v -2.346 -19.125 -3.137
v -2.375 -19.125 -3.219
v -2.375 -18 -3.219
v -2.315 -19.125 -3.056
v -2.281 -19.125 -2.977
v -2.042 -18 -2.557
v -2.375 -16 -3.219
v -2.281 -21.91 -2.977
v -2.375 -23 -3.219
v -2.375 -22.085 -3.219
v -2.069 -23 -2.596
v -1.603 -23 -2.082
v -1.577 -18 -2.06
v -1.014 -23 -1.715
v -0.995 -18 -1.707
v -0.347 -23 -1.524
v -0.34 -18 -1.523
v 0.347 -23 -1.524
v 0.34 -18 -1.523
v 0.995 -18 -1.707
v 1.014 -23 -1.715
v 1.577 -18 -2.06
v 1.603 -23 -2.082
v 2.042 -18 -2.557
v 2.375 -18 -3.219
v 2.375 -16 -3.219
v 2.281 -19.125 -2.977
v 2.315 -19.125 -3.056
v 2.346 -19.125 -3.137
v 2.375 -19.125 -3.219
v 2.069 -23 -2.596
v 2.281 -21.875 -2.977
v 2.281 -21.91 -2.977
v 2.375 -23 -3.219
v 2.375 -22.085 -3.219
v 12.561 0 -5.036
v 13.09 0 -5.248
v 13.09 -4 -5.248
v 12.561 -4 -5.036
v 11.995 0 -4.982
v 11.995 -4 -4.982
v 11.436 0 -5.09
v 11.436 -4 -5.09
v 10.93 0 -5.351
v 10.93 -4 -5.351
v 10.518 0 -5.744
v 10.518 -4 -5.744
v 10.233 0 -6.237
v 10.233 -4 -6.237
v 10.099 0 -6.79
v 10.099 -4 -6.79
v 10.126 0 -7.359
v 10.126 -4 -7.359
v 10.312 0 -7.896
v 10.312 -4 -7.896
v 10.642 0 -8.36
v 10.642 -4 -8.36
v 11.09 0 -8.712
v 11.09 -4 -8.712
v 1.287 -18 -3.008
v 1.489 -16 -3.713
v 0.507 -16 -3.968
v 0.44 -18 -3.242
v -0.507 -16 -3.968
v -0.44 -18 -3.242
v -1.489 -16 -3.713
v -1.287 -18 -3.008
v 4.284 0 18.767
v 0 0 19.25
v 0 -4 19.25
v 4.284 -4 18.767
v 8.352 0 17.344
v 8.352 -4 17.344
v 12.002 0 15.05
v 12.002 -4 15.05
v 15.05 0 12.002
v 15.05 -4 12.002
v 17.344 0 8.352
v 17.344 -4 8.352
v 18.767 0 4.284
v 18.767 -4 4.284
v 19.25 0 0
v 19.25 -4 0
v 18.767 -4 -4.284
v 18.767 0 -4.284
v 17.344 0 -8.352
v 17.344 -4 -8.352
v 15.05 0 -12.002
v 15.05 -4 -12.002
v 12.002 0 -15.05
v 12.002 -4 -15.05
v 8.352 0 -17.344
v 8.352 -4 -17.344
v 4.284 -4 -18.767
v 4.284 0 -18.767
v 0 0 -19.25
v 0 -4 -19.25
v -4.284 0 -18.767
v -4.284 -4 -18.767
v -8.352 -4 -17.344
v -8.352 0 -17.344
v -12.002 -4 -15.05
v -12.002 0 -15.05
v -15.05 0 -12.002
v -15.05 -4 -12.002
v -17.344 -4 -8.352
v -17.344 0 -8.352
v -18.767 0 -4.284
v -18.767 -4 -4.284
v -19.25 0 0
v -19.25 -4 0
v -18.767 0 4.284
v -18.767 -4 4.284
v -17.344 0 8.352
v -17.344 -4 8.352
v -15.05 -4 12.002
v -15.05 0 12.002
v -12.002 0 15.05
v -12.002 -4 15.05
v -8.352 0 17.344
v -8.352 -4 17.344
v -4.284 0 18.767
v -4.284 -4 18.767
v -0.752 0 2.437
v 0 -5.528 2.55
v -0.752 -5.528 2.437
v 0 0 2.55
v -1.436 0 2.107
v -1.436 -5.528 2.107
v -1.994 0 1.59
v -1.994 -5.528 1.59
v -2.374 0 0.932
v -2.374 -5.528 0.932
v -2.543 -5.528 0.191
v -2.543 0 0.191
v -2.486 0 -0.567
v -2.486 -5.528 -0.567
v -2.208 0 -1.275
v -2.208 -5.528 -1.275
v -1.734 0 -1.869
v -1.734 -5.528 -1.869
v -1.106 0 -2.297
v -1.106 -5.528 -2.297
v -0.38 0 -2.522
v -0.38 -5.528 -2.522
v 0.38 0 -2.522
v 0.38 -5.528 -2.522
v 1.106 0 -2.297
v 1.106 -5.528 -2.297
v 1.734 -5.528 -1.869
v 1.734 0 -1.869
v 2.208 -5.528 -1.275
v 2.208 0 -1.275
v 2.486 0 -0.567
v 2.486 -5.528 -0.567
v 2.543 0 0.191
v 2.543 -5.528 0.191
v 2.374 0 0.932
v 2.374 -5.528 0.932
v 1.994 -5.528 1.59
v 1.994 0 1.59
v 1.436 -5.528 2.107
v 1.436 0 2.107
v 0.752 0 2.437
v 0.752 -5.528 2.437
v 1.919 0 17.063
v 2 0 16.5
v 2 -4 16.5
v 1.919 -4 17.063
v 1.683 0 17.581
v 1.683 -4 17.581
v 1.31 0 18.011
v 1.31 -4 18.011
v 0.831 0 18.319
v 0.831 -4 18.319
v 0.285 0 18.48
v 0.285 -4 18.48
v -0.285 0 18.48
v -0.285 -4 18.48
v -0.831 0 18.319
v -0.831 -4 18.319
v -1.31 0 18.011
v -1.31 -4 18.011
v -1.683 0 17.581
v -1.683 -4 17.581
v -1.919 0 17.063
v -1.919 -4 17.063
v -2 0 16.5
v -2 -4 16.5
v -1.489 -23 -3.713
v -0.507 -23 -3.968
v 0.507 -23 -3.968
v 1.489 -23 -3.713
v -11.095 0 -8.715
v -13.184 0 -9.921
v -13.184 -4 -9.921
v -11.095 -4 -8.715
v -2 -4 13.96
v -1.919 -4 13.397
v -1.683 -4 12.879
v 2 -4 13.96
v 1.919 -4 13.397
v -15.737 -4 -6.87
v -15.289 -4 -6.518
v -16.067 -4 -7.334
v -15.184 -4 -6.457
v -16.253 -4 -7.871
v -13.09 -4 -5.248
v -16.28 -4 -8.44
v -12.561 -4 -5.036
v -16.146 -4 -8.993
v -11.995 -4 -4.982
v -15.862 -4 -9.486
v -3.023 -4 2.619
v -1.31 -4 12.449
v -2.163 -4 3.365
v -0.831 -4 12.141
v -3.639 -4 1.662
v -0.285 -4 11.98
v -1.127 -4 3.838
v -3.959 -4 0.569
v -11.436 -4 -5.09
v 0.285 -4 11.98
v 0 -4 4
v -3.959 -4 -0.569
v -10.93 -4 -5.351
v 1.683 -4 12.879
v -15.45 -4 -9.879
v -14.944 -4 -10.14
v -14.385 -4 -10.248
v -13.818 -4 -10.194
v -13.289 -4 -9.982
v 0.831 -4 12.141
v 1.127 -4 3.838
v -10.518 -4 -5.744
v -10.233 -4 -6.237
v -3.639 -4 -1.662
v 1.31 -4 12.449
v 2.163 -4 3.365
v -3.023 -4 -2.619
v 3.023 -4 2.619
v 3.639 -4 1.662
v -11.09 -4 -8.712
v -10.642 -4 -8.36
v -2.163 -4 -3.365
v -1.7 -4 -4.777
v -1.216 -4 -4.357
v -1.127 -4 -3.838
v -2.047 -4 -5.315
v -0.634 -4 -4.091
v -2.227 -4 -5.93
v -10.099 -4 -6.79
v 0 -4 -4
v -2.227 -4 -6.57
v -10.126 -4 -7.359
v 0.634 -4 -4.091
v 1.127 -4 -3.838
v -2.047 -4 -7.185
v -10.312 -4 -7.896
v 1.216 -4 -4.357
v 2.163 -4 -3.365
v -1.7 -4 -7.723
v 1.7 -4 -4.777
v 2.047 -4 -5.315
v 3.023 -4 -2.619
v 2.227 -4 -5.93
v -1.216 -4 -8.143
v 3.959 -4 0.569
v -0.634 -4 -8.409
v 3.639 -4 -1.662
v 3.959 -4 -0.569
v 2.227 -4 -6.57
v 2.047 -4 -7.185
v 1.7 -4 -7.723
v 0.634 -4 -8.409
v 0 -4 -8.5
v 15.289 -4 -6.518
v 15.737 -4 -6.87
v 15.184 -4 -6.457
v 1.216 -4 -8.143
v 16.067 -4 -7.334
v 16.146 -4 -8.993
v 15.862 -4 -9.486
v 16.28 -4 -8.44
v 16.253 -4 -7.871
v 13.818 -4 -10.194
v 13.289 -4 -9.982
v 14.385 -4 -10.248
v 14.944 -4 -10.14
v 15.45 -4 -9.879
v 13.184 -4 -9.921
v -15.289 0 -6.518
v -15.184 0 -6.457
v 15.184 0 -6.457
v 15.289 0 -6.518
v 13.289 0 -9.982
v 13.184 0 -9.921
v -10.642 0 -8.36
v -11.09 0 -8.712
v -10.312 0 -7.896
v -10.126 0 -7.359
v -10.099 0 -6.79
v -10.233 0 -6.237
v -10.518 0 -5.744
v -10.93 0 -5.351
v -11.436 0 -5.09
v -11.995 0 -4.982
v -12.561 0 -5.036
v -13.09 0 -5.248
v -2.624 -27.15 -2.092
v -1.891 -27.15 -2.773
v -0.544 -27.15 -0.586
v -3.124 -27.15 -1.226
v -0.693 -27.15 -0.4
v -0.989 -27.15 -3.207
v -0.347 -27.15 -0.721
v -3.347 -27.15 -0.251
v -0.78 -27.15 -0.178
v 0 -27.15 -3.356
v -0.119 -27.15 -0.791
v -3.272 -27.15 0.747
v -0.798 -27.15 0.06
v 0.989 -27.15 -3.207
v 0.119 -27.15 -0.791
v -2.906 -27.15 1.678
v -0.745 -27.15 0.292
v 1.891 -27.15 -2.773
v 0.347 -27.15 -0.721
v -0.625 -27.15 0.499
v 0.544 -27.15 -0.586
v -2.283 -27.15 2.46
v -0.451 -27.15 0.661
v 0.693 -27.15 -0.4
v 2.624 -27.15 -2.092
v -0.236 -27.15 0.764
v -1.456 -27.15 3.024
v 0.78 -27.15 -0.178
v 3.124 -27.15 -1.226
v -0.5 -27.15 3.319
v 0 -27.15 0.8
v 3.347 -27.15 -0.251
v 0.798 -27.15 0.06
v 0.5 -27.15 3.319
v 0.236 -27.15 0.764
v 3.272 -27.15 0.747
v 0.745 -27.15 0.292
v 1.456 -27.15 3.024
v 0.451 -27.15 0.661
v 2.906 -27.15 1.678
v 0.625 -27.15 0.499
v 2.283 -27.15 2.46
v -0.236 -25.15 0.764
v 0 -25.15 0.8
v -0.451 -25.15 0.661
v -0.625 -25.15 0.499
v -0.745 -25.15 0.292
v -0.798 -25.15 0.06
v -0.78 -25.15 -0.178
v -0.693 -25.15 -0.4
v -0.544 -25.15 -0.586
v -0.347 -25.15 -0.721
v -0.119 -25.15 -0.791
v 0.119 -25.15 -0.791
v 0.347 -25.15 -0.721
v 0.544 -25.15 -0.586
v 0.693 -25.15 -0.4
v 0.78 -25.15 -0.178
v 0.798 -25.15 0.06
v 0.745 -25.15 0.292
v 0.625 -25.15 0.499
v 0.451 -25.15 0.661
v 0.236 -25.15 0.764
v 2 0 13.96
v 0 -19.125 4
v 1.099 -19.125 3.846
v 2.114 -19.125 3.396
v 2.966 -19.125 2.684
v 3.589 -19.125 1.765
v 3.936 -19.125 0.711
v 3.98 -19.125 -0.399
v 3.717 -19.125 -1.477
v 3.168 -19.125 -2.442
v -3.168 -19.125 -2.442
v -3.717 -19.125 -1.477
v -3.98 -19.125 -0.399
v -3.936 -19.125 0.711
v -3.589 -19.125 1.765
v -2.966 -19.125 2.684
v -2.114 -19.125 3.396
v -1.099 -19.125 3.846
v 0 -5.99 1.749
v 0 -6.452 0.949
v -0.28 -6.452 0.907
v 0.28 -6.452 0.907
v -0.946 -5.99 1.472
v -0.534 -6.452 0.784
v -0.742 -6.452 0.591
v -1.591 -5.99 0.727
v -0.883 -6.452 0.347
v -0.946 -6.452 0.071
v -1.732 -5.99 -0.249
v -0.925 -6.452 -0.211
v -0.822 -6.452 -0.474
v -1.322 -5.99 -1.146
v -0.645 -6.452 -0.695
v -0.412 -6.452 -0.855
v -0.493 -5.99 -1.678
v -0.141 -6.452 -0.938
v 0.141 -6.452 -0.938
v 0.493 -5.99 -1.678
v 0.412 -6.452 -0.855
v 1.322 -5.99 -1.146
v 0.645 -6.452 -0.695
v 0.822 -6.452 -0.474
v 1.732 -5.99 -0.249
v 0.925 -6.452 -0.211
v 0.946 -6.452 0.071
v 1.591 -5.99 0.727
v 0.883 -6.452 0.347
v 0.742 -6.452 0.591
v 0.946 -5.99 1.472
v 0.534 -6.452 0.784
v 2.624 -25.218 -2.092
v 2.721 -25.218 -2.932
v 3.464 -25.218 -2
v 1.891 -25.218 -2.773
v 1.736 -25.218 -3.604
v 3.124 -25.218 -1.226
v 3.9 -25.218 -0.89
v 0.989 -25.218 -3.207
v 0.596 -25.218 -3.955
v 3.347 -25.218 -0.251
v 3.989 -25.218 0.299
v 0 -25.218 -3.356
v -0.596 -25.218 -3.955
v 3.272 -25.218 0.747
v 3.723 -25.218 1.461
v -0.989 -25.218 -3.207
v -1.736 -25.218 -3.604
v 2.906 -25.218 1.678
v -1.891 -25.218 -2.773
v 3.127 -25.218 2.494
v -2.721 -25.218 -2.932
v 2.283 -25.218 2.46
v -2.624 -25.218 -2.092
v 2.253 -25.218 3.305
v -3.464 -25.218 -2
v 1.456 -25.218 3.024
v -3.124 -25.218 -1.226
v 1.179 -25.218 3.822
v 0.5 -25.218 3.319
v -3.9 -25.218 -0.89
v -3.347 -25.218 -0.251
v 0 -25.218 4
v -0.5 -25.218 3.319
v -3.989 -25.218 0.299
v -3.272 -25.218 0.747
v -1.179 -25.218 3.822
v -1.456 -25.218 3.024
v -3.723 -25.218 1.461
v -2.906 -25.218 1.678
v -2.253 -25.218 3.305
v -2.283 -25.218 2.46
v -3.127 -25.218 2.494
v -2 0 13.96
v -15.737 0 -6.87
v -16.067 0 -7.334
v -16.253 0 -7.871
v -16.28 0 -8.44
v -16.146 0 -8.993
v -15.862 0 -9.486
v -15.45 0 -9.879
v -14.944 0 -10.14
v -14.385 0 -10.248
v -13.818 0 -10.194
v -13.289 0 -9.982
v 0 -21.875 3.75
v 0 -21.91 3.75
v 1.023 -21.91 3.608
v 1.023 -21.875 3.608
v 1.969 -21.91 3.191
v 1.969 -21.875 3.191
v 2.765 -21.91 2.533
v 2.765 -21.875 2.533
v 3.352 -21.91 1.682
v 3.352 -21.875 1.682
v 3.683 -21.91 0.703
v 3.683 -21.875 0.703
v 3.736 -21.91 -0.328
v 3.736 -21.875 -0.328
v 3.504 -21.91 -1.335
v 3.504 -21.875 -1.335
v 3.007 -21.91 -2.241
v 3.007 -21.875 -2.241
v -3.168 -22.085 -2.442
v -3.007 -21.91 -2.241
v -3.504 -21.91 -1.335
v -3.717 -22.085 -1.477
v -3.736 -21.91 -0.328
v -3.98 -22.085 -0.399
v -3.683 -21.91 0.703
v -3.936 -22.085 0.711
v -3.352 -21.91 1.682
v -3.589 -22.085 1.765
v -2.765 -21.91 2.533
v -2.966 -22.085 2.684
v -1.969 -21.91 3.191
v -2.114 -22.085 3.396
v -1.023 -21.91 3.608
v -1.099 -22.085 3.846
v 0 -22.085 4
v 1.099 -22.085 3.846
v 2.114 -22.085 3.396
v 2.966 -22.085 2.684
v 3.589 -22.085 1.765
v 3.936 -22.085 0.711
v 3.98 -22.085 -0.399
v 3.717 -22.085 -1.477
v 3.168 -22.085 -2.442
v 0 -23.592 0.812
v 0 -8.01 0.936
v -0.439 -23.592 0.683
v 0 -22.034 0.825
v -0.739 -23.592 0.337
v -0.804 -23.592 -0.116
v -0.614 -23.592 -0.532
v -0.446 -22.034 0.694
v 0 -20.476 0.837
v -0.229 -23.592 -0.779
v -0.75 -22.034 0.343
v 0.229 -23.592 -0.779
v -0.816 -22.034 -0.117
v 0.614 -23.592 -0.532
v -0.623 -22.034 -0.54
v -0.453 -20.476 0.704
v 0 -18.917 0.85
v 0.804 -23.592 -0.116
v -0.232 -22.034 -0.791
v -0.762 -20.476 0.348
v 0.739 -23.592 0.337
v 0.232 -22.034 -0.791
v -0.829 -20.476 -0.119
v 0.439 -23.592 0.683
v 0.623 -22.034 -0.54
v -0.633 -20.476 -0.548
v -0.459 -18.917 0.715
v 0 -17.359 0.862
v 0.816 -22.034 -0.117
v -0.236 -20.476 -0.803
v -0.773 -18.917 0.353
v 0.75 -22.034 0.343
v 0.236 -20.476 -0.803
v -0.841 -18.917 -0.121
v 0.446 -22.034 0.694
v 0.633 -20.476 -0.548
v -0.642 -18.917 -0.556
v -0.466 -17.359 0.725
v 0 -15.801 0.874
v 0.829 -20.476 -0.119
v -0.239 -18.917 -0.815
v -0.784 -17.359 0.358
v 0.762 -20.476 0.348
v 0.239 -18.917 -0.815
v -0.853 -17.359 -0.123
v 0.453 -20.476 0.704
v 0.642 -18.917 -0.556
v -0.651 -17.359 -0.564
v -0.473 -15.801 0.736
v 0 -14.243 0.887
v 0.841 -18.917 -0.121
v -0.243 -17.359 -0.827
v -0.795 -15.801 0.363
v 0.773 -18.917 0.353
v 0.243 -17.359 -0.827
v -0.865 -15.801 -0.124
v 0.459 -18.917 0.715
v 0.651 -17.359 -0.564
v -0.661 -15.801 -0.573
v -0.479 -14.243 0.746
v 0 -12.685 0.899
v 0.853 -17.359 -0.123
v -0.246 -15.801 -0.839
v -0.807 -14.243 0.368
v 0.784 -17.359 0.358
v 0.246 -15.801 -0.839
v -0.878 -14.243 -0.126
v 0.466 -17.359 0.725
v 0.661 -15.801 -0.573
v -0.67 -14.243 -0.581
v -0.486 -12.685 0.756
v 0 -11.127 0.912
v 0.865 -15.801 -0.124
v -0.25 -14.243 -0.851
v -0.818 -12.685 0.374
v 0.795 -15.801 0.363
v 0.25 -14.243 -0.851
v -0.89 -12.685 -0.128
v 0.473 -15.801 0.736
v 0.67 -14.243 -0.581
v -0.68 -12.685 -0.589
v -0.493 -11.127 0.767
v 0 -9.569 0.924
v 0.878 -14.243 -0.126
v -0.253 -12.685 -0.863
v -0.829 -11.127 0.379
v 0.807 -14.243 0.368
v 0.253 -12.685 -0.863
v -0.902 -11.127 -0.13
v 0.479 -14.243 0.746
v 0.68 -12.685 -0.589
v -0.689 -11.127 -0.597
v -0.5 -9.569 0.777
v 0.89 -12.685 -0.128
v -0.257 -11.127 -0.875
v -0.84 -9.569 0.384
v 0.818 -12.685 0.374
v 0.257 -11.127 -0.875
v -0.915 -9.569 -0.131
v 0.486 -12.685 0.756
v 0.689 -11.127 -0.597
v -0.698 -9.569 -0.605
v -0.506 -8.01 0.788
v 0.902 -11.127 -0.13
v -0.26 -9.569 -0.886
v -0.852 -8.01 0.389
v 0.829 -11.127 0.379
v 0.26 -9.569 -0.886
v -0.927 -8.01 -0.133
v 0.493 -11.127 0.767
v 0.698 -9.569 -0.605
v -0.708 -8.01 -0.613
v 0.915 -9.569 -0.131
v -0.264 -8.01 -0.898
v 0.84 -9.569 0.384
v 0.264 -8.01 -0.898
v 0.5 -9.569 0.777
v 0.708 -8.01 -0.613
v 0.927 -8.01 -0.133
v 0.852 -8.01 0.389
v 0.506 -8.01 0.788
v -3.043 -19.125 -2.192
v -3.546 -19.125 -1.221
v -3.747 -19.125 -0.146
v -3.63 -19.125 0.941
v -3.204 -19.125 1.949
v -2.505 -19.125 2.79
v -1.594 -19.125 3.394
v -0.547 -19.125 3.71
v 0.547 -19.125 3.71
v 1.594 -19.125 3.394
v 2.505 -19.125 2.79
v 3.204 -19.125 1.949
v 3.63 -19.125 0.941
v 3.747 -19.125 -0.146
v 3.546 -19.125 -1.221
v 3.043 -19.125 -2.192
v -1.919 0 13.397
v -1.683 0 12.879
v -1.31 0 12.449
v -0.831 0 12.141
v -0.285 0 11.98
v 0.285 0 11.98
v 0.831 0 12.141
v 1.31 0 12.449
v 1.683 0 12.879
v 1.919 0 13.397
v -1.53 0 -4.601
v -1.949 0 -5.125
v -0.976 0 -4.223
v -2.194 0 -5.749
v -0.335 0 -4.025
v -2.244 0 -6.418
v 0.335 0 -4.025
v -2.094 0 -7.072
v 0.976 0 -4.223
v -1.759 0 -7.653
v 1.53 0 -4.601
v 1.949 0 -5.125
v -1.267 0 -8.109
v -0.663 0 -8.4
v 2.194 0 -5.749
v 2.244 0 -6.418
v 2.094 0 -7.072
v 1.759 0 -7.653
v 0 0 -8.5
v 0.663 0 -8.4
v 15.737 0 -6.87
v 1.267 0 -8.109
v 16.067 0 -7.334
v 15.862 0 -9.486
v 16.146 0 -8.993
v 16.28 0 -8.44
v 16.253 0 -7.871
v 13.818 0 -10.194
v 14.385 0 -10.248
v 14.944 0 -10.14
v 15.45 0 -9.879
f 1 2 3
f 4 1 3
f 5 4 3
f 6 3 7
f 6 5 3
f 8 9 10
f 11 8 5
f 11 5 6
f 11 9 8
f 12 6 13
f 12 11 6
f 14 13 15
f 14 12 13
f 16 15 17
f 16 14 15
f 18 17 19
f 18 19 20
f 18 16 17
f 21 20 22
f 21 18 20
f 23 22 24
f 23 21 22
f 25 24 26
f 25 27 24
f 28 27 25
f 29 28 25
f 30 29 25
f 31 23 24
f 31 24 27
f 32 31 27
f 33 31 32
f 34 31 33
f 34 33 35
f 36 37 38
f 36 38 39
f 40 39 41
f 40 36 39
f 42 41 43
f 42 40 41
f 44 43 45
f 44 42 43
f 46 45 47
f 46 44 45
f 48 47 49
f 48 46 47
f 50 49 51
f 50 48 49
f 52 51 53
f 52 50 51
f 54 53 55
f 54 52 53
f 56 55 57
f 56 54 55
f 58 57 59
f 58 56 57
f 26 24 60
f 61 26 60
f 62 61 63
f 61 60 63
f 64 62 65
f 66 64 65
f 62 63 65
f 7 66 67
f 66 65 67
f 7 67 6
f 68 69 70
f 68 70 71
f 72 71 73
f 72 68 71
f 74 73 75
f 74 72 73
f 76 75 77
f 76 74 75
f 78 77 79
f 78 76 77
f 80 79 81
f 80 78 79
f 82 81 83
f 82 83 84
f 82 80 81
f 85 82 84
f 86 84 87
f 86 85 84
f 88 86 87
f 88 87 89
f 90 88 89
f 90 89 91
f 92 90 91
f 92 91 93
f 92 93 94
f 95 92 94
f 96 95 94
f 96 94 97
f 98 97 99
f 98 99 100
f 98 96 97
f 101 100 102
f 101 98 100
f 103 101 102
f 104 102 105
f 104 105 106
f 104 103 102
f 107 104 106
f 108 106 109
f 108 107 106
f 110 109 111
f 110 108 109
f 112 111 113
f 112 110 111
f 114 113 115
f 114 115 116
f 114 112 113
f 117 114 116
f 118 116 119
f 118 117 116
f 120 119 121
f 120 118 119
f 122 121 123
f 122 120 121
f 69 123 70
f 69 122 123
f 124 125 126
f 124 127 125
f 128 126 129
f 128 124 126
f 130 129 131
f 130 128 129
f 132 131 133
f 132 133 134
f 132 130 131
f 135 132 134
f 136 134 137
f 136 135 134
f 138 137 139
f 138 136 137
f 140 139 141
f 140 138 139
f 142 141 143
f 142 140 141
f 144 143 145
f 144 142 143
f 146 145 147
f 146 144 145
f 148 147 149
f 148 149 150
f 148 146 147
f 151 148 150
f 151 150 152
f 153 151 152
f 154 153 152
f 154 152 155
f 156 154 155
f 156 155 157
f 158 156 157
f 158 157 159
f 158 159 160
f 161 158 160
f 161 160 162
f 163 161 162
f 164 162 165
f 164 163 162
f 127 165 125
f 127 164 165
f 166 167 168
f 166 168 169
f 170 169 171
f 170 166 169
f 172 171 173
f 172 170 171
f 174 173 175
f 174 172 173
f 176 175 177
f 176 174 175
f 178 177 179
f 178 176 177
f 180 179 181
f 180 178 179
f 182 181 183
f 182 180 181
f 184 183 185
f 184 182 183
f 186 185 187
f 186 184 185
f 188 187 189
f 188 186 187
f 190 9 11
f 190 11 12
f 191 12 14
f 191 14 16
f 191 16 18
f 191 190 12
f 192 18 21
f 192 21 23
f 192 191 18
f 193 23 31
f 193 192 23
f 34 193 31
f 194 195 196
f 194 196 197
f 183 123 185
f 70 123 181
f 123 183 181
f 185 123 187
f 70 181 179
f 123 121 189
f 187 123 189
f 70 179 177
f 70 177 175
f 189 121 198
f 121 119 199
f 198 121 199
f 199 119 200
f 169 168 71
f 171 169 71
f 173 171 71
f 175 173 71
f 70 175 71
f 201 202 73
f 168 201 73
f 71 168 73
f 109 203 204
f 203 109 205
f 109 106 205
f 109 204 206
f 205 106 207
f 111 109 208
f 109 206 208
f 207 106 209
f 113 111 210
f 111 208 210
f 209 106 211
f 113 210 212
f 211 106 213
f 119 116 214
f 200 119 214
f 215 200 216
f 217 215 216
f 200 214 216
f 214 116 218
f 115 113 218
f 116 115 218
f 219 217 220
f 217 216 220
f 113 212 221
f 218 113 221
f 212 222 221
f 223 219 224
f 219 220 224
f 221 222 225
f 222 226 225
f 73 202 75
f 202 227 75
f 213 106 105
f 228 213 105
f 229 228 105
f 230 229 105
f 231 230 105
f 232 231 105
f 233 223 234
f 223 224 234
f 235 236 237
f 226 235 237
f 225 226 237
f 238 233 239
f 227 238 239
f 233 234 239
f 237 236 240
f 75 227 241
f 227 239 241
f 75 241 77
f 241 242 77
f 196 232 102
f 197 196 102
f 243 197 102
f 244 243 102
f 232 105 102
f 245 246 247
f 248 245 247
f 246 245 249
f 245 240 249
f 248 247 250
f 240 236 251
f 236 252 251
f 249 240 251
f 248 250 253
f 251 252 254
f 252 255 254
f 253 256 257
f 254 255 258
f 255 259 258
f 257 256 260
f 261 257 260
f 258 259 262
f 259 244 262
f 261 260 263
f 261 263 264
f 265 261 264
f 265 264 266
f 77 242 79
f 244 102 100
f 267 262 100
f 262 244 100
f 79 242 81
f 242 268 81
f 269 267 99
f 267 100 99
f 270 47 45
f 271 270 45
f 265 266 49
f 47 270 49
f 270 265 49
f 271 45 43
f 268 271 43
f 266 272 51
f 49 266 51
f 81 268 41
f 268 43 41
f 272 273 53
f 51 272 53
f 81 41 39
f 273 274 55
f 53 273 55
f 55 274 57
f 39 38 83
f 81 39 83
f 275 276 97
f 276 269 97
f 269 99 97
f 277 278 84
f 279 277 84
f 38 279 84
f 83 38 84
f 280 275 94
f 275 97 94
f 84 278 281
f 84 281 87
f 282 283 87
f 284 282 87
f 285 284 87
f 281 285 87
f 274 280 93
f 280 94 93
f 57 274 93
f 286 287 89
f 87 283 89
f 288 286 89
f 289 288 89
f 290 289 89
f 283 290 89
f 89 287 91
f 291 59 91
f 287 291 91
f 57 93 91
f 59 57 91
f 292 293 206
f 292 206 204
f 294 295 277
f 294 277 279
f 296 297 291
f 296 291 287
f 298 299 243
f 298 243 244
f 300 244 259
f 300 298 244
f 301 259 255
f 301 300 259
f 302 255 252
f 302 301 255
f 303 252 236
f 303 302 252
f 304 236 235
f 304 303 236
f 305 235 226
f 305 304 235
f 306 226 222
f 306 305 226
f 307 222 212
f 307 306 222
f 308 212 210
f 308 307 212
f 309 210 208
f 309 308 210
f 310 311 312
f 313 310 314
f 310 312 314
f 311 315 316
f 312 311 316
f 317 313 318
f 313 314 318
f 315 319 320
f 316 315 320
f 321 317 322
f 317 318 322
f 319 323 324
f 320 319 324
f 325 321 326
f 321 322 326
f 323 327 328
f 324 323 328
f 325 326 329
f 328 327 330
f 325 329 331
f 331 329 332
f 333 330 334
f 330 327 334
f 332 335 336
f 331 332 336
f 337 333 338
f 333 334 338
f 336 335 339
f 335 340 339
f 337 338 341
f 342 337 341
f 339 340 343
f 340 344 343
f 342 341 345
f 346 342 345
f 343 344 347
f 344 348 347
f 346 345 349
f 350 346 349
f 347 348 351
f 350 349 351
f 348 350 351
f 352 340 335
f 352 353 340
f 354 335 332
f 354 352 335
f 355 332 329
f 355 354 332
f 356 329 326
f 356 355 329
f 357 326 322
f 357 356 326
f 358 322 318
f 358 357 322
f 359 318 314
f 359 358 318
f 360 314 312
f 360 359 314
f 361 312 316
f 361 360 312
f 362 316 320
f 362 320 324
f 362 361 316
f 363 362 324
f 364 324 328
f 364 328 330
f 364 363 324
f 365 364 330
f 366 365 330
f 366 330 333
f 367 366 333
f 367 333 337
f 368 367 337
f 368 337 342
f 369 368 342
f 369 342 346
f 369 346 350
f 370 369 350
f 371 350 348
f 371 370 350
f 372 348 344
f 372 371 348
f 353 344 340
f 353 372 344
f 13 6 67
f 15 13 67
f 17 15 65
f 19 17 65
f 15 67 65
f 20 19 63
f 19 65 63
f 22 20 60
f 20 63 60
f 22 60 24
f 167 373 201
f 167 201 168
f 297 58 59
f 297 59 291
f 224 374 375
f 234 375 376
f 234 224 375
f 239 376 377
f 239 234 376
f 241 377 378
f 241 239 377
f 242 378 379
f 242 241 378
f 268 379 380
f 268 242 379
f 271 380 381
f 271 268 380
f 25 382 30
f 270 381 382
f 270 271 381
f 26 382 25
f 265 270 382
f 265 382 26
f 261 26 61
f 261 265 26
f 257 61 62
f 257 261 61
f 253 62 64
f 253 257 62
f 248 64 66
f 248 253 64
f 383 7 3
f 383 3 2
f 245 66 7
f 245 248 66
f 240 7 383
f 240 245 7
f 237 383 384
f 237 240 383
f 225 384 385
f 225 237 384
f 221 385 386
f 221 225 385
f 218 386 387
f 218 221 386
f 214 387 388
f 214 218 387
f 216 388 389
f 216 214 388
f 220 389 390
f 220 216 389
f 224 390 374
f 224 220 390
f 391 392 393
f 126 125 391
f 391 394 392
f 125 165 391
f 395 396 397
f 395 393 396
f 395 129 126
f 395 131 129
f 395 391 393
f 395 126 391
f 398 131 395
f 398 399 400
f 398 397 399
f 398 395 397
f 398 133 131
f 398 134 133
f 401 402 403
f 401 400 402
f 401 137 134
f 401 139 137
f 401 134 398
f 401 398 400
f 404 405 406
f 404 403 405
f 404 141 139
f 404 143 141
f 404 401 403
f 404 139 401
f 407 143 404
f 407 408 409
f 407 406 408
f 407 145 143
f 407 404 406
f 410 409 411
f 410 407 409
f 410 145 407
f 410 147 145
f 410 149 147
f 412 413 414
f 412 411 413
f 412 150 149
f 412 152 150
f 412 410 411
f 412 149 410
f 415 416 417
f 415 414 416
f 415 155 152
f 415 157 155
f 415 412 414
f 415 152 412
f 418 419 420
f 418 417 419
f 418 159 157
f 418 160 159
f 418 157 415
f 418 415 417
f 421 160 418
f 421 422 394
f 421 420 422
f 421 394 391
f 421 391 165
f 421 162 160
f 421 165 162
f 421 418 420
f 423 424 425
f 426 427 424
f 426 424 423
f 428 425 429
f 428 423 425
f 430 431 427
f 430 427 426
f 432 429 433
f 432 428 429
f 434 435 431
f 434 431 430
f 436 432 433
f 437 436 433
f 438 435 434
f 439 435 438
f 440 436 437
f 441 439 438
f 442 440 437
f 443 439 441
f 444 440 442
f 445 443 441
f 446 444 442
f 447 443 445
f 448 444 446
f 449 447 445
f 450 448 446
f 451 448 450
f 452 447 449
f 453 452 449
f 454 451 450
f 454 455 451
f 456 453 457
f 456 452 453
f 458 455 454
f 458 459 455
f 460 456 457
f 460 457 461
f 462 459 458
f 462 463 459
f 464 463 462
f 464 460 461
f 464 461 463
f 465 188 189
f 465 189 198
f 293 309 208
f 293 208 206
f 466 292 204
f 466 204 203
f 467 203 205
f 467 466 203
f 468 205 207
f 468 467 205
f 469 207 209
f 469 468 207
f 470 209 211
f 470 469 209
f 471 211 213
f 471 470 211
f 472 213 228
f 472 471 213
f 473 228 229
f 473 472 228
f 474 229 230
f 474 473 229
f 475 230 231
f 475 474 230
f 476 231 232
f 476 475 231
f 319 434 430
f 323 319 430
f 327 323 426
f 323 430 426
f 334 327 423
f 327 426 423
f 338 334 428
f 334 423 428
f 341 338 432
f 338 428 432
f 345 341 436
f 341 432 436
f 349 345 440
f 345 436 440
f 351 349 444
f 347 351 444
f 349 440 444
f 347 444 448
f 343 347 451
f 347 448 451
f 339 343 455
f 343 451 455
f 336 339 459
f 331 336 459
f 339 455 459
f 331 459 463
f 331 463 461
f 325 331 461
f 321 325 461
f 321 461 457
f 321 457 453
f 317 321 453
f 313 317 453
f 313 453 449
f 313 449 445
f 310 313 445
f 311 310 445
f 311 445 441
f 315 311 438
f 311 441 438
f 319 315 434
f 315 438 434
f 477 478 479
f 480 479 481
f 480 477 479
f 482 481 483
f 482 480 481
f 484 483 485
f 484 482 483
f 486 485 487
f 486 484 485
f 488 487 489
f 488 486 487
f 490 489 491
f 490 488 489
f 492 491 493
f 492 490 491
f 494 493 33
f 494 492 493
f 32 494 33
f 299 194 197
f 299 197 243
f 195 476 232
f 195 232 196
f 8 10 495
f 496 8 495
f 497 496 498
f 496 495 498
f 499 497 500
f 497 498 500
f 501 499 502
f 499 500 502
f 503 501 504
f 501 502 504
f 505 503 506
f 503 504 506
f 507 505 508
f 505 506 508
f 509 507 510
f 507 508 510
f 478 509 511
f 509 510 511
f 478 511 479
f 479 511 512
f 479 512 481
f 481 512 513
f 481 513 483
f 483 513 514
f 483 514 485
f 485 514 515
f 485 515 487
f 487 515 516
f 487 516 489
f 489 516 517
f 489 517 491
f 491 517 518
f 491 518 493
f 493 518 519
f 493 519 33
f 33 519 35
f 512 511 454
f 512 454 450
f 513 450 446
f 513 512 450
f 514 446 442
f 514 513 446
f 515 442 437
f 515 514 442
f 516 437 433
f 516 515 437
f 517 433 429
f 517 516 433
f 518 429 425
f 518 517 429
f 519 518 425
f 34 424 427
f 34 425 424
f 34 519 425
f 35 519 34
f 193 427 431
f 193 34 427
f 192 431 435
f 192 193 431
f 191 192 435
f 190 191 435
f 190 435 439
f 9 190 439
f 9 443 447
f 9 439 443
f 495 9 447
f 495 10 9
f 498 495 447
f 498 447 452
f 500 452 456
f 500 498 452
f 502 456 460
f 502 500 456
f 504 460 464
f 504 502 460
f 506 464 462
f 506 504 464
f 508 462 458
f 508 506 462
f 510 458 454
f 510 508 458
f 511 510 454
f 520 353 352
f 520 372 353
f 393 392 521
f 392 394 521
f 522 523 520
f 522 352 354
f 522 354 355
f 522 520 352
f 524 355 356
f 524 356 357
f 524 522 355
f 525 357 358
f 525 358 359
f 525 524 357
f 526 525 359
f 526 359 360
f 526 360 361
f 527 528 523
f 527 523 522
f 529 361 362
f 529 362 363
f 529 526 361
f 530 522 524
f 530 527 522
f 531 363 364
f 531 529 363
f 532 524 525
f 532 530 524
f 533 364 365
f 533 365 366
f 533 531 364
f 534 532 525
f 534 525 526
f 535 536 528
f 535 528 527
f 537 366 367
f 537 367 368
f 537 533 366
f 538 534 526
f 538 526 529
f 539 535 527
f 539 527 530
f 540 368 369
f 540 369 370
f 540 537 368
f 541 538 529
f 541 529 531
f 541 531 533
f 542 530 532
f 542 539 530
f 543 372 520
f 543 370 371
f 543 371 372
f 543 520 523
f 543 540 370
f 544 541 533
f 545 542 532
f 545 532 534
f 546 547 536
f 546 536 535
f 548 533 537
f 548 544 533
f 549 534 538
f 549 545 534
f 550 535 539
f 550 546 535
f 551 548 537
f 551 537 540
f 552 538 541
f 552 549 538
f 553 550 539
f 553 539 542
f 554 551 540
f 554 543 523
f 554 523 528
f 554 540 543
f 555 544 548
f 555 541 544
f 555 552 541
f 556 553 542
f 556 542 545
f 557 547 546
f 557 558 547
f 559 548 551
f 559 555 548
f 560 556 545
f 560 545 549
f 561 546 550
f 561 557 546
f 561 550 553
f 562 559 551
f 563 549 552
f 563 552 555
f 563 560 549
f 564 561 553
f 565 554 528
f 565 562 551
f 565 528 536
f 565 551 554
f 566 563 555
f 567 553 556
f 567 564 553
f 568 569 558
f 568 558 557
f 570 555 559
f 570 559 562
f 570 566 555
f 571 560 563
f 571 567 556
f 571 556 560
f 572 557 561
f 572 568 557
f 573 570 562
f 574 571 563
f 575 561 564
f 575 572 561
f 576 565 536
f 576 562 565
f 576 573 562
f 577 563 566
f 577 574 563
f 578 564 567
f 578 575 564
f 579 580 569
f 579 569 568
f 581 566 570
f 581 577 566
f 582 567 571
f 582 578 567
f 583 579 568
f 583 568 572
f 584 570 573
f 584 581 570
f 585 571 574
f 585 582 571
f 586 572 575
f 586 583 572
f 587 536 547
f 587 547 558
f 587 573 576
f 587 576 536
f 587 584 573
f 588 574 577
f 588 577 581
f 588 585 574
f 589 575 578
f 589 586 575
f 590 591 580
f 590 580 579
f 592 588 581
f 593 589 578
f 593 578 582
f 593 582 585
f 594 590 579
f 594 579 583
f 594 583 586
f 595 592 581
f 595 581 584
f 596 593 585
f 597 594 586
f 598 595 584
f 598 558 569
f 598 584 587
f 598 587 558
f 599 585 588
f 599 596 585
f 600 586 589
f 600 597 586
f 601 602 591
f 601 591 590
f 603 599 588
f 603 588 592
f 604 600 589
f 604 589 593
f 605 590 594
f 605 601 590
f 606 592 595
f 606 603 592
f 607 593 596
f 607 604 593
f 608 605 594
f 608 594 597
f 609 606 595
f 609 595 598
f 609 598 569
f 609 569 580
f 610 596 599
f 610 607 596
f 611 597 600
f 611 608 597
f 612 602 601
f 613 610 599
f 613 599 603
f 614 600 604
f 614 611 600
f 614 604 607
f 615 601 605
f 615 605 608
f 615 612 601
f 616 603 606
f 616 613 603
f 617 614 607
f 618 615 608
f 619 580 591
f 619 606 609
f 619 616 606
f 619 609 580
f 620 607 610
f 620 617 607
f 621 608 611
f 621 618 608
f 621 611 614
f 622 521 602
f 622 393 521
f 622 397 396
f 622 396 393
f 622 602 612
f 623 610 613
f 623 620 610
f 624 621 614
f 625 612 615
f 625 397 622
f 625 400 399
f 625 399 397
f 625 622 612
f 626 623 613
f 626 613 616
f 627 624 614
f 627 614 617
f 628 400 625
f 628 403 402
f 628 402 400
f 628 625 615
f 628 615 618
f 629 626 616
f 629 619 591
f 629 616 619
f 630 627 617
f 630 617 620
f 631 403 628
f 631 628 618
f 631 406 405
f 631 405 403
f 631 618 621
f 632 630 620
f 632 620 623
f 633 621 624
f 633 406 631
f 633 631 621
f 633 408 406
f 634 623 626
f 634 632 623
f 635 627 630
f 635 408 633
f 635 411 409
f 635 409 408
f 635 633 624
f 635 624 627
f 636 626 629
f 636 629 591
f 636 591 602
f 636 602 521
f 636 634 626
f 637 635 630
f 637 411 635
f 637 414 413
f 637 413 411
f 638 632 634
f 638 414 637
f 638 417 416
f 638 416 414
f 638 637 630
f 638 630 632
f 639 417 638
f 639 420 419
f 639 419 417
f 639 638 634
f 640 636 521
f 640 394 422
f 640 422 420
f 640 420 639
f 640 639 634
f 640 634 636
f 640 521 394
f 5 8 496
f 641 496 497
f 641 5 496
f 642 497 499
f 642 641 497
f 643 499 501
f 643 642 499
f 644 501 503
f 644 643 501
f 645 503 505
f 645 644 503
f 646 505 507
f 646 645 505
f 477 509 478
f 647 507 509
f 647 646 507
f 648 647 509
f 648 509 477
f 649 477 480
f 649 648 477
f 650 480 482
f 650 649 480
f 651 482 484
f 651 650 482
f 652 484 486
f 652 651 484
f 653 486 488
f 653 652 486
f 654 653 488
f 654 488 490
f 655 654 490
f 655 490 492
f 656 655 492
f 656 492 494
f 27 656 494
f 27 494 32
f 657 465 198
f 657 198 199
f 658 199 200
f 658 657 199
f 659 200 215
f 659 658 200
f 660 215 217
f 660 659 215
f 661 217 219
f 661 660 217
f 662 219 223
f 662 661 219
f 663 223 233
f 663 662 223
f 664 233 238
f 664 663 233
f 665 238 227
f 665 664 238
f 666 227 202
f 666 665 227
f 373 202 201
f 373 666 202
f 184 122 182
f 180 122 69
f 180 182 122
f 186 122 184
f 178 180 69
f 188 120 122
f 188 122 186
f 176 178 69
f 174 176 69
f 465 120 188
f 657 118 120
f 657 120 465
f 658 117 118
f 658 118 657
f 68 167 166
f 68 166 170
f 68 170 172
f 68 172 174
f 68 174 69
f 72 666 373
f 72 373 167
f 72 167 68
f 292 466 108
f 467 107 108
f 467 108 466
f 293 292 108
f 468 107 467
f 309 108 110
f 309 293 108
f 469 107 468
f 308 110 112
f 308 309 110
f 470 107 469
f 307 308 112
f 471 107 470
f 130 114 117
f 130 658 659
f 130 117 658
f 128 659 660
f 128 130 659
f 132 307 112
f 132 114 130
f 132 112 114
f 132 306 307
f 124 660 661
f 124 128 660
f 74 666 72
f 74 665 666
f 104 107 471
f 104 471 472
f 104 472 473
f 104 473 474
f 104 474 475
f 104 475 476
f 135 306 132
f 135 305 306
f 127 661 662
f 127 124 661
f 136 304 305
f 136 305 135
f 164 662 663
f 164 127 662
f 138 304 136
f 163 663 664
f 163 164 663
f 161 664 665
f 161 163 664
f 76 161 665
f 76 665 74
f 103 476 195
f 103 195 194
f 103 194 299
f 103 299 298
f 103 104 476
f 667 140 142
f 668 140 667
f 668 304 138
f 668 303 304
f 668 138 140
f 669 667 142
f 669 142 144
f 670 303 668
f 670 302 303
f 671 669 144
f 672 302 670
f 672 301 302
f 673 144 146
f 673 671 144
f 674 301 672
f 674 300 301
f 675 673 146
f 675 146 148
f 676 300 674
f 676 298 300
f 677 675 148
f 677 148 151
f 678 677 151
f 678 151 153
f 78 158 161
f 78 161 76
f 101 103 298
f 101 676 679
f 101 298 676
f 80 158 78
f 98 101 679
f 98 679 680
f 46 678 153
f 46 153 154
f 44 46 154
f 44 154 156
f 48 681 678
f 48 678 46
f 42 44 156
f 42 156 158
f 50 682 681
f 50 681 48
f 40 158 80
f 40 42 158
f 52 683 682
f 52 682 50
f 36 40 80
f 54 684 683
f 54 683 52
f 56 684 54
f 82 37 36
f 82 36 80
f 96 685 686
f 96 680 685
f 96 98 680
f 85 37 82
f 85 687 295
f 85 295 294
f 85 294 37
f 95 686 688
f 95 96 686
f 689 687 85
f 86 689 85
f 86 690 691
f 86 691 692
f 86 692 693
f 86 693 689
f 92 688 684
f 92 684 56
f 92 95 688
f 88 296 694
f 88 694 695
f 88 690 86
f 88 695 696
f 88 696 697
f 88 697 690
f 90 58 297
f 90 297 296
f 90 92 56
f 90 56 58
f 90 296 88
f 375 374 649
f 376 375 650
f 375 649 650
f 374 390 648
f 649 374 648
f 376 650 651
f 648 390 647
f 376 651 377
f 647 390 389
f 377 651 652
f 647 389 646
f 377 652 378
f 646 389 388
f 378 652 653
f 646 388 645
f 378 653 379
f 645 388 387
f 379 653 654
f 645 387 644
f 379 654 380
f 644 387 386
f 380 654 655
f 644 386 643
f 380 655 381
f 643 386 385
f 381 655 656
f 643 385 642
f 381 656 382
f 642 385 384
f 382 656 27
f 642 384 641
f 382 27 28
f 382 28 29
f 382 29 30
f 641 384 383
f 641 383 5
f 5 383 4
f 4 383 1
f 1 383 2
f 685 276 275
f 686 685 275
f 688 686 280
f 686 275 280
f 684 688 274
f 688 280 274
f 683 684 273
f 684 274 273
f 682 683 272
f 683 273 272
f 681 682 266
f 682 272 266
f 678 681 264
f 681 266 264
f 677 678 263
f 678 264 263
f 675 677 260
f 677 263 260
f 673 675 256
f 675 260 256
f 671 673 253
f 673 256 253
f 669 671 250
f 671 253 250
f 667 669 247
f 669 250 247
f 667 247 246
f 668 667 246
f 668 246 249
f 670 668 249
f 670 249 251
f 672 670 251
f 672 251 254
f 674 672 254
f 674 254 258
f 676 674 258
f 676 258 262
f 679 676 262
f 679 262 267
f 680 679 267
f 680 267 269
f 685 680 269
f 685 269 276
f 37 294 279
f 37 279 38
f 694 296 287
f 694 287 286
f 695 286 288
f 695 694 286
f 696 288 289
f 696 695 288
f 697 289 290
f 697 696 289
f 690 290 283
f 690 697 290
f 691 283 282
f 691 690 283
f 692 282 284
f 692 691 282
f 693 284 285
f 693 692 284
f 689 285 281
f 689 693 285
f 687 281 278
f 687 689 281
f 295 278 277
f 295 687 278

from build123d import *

# Parameters (mm, degrees)
SKETCH1_R           = 19.25
SKETCH1_R_2         = 4
BOSS_EXTRUDE1_DEPTH = 4
SKETCH1_4_R         = 4
BOSS_EXTRUDE2_DEPTH = 27.15
CUT_EXTRUDE1_START  = -1.932
SKETCH6_R           = 4
SKETCH6_R_2         = 3.356
CUT_EXTRUDE1_DEPTH  = 1.932
SKETCH7_R           = 2.25
CUT_EXTRUDE2_DEPTH  = 36.735801376
SKETCH8_R           = 2.5
CUT_EXTRUDE3_DEPTH  = 5
CHAMFER1_SIZE       = 2
CHAMFER1_SIZE2      = 0.727940469
SKETCH9_W           = 0.25
SKETCH9_H           = 2.75
CHAMFER3_SIZE       = 0.3
CHAMFER3_SIZE_2     = 0.210062261


with BuildPart() as part:
    # Sketch1 → Boss-Extrude1 (new body)
    # profile 1 of 2: a face of its own
    with BuildSketch(Plane(origin=(0, 0, 0), x_dir=(1, 0, 0), z_dir=(0, 1, 0))):
        with Locations(Location((0, 0, 0), (0, 0, 270))):
            Circle(SKETCH1_R)
        with BuildLine():
            ThreePointArc((2, -16.5), (0, -18.5), (-2, -16.5))
            Line((-2, -16.5), (-2, -16.378339354))
            ThreePointArc((-2, -16.378339354), (-14.289419162, -8.25), (-15.184057953, 6.45711887))
            Line((-15.184057953, 6.45711887), (-15.289419162, 6.517949192))
            ThreePointArc((-15.289419162, 6.517949192), (-16.02146997, 9.25), (-13.289419162, 9.982050808))
            Line((-13.289419162, 9.982050808), (-13.184057953, 9.921220485))
            ThreePointArc((-13.184057953, 9.921220485), (0, 16.5), (13.184057953, 9.921220485))
            Line((13.184057953, 9.921220485), (13.289419162, 9.982050808))
            ThreePointArc((13.289419162, 9.982050808), (16.02146997, 9.25), (15.289419162, 6.517949192))
            Line((15.289419162, 6.517949192), (15.184057953, 6.45711887))
            ThreePointArc((15.184057953, 6.45711887), (16.167667677, 3.294923655), (16.5, 0))
            ThreePointArc((16.5, 0), (12.354149101, -10.937321427), (2, -16.378339354))
            Line((2, -16.378339354), (2, -16.5))
        make_face(mode=Mode.SUBTRACT)
    # profile 2 of 2: a face of its own
    with BuildSketch(Plane(origin=(0, 0, 0), x_dir=(1, 0, 0), z_dir=(0, 1, 0))):
        with BuildLine():
            ThreePointArc((-15.184057953, 6.45711887), (-14.289419162, -8.25), (-2, -16.378339354))
            Line((-2, -16.378339354), (-2, -13.96))
            ThreePointArc((-2, -13.96), (0, -11.96), (2, -13.96))
            Line((2, -13.96), (2, -16.378339354))
            ThreePointArc((2, -16.378339354), (12.354149101, -10.937321427), (16.5, 0))
            ThreePointArc((16.5, 0), (16.167667677, 3.294923655), (15.184057953, 6.45711887))
            Line((15.184057953, 6.45711887), (13.089714637, 5.247949192))
            ThreePointArc((13.089714637, 5.247949192), (10.357663829, 5.98), (11.089714637, 8.712050808))
            Line((11.089714637, 8.712050808), (13.184057953, 9.921220485))
            ThreePointArc((13.184057953, 9.921220485), (0, 16.5), (-13.184057953, 9.921220485))
            Line((-13.184057953, 9.921220485), (-11.094979939, 8.715090731))
            Line((-11.094979939, 8.715090731), (-11.089714637, 8.712050808))
            ThreePointArc((-11.089714637, 8.712050808), (-10.357663829, 5.98), (-13.089714637, 5.247949192))
            Line((-13.089714637, 5.247949192), (-15.184057953, 6.45711887))
        make_face()
        with Locations(Location((0, 0, 0), (0, 0, 270))):
            Circle(SKETCH1_R_2, mode=Mode.SUBTRACT)
    extrude(amount=-BOSS_EXTRUDE1_DEPTH)

    # Sketch1<4> → Boss-Extrude2 (add)
    with BuildSketch(Plane(origin=(0, 0, 0), x_dir=(1, 0, 0), z_dir=(0, 1, 0))):
        with Locations(Location((0, 0, 0), (0, 0, 270))):
            Circle(SKETCH1_4_R)
    extrude(amount=-BOSS_EXTRUDE2_DEPTH)

    # Sketch2 → Cut-Revolve4 (revolve, cut)
    with BuildSketch(Plane(origin=(0, 0, 0), x_dir=(0, 0, -1), z_dir=(1, 0, 0)), mode=Mode.PRIVATE) as cut_revolve4_sk:
        Polygon((0, -27.15), (0.8, -27.15), (0.8, -25.15), (1, 0), (0, 0), align=None)
    revolve(cut_revolve4_sk.sketch.rotate(Axis((0, 0, 0), (0, -1, 0)), 180), axis=Axis((0, 0, 0), (0, -1, 0)), mode=Mode.SUBTRACT)

    # Sketch5 → Cut-Revolve8 (revolve, cut)
    with BuildSketch(Plane.XY, mode=Mode.PRIVATE) as cut_revolve8_sk:
        Polygon((0, -7), (-2.55, -5.527756814), (-2.55, 0), (0, 0), align=None)
    revolve(cut_revolve8_sk.sketch.rotate(Axis((0, 0, 0), (0, -1, 0)), 270), axis=Axis((0, 0, 0), (0, -1, 0)), mode=Mode.SUBTRACT)

    # Sketch6 → Cut-Extrude1 (cut)
    with BuildSketch(Plane.XZ.offset(27.15).offset(CUT_EXTRUDE1_START)):
        with Locations(Location((0, 0, 0), (0, 0, 90))):
            Circle(SKETCH6_R)
        with Locations(Location((0, 0, 0), (0, 0, 270))):
            Circle(SKETCH6_R_2, mode=Mode.SUBTRACT)
    extrude(amount=CUT_EXTRUDE1_DEPTH, mode=Mode.SUBTRACT)

    # Sketch7 → Cut-Extrude2 (cut, through all)
    with BuildSketch(Plane.XZ.offset(4)):
        with Locations(Location((0, -6.25, 0), (0, 0, 270))):
            Circle(SKETCH7_R)
    extrude(amount=-CUT_EXTRUDE2_DEPTH, mode=Mode.SUBTRACT)

    # Sketch8 → Cut-Extrude3 (cut)
    with BuildSketch(Plane(origin=(0, -23, 0), x_dir=(1, 0, 0), z_dir=(0, 1, 0))):
        with Locations((0, 4)):
            Circle(SKETCH8_R)
    extrude(amount=CUT_EXTRUDE3_DEPTH, mode=Mode.SUBTRACT)

    # Chamfer1
    chamfer1_edges = [part.edges().sort_by_distance(p)[0] for p in [
        (0, -18, -4),
    ]]
    chamfer1_side = [part.faces().sort_by_distance(p)[0] for p in [
        (0, -14.609, -4),
    ]]
    chamfer(chamfer1_edges, length=CHAMFER1_SIZE, length2=CHAMFER1_SIZE2, reference=chamfer1_side[0])

    # Sketch9 → Cut-Revolve9 (revolve, cut)
    with BuildSketch(Plane(origin=(0, 0, 0), x_dir=(0, 0, -1), z_dir=(1, 0, 0)), mode=Mode.PRIVATE) as cut_revolve9_sk:
        with Locations((-3.875, -20.5)):
            Rectangle(SKETCH9_W, SKETCH9_H)
    revolve(cut_revolve9_sk.sketch.rotate(Axis((0, -27.15, 0), (0, 1, 0)), 143.580086271), axis=Axis((0, -27.15, 0), (0, 1, 0)), mode=Mode.SUBTRACT)

    # Chamfer3
    # the kernel refuses this chamfer: 0.3, 0.210062261 mm, written as the material it takes off along each edge
    with BuildSketch(Plane(origin=(0, -21.875, 0), x_dir=(-0.42752924874280274, 0, -0.9040015162981834), z_dir=(0.9040015162981834, 0, -0.42752924874280274))) as chamfer3_piece_1_section:
        Polygon((4 - CHAMFER3_SIZE, 0), (4, -CHAMFER3_SIZE_2 * 1.0000000022), (4, 0), align=None)
    chamfer3_piece_1 = revolve(axis=Axis((0, -21.875, 0), (0, 1, 0)), revolution_arc=154.689138052, mode=Mode.PRIVATE)
    chamfer3_piece_1 = chamfer3_piece_1 - Plane(origin=(0, -21.995167344, 0), x_dir=(0.593698599754949, 0, -0.8046874999955033), z_dir=(0, -1, 0)) * Cylinder(3.75, 16, mode=Mode.PRIVATE)
    add(chamfer3_piece_1, mode=Mode.SUBTRACT)
    with BuildSketch(Plane(origin=(0, -21.875, 0), x_dir=(0, 0, 1), z_dir=(-1, 0, 0))) as chamfer3_piece_2_section:
        Polygon((4 - CHAMFER3_SIZE, 0), (4, -CHAMFER3_SIZE_2 * 1.0000000022), (4, 0), align=None)
    chamfer3_piece_2 = revolve(axis=Axis((0, -21.875, 0), (0, 1, 0)), revolution_arc=154.689138052, mode=Mode.PRIVATE)
    chamfer3_piece_2 = chamfer3_piece_2 - Plane(origin=(0, -21.995167344, 0), x_dir=(0.593698599754949, 0, -0.8046874999955033), z_dir=(0, -1, 0)) * Cylinder(3.75, 16, mode=Mode.PRIVATE)
    add(chamfer3_piece_2, mode=Mode.SUBTRACT)


solid = part.part
